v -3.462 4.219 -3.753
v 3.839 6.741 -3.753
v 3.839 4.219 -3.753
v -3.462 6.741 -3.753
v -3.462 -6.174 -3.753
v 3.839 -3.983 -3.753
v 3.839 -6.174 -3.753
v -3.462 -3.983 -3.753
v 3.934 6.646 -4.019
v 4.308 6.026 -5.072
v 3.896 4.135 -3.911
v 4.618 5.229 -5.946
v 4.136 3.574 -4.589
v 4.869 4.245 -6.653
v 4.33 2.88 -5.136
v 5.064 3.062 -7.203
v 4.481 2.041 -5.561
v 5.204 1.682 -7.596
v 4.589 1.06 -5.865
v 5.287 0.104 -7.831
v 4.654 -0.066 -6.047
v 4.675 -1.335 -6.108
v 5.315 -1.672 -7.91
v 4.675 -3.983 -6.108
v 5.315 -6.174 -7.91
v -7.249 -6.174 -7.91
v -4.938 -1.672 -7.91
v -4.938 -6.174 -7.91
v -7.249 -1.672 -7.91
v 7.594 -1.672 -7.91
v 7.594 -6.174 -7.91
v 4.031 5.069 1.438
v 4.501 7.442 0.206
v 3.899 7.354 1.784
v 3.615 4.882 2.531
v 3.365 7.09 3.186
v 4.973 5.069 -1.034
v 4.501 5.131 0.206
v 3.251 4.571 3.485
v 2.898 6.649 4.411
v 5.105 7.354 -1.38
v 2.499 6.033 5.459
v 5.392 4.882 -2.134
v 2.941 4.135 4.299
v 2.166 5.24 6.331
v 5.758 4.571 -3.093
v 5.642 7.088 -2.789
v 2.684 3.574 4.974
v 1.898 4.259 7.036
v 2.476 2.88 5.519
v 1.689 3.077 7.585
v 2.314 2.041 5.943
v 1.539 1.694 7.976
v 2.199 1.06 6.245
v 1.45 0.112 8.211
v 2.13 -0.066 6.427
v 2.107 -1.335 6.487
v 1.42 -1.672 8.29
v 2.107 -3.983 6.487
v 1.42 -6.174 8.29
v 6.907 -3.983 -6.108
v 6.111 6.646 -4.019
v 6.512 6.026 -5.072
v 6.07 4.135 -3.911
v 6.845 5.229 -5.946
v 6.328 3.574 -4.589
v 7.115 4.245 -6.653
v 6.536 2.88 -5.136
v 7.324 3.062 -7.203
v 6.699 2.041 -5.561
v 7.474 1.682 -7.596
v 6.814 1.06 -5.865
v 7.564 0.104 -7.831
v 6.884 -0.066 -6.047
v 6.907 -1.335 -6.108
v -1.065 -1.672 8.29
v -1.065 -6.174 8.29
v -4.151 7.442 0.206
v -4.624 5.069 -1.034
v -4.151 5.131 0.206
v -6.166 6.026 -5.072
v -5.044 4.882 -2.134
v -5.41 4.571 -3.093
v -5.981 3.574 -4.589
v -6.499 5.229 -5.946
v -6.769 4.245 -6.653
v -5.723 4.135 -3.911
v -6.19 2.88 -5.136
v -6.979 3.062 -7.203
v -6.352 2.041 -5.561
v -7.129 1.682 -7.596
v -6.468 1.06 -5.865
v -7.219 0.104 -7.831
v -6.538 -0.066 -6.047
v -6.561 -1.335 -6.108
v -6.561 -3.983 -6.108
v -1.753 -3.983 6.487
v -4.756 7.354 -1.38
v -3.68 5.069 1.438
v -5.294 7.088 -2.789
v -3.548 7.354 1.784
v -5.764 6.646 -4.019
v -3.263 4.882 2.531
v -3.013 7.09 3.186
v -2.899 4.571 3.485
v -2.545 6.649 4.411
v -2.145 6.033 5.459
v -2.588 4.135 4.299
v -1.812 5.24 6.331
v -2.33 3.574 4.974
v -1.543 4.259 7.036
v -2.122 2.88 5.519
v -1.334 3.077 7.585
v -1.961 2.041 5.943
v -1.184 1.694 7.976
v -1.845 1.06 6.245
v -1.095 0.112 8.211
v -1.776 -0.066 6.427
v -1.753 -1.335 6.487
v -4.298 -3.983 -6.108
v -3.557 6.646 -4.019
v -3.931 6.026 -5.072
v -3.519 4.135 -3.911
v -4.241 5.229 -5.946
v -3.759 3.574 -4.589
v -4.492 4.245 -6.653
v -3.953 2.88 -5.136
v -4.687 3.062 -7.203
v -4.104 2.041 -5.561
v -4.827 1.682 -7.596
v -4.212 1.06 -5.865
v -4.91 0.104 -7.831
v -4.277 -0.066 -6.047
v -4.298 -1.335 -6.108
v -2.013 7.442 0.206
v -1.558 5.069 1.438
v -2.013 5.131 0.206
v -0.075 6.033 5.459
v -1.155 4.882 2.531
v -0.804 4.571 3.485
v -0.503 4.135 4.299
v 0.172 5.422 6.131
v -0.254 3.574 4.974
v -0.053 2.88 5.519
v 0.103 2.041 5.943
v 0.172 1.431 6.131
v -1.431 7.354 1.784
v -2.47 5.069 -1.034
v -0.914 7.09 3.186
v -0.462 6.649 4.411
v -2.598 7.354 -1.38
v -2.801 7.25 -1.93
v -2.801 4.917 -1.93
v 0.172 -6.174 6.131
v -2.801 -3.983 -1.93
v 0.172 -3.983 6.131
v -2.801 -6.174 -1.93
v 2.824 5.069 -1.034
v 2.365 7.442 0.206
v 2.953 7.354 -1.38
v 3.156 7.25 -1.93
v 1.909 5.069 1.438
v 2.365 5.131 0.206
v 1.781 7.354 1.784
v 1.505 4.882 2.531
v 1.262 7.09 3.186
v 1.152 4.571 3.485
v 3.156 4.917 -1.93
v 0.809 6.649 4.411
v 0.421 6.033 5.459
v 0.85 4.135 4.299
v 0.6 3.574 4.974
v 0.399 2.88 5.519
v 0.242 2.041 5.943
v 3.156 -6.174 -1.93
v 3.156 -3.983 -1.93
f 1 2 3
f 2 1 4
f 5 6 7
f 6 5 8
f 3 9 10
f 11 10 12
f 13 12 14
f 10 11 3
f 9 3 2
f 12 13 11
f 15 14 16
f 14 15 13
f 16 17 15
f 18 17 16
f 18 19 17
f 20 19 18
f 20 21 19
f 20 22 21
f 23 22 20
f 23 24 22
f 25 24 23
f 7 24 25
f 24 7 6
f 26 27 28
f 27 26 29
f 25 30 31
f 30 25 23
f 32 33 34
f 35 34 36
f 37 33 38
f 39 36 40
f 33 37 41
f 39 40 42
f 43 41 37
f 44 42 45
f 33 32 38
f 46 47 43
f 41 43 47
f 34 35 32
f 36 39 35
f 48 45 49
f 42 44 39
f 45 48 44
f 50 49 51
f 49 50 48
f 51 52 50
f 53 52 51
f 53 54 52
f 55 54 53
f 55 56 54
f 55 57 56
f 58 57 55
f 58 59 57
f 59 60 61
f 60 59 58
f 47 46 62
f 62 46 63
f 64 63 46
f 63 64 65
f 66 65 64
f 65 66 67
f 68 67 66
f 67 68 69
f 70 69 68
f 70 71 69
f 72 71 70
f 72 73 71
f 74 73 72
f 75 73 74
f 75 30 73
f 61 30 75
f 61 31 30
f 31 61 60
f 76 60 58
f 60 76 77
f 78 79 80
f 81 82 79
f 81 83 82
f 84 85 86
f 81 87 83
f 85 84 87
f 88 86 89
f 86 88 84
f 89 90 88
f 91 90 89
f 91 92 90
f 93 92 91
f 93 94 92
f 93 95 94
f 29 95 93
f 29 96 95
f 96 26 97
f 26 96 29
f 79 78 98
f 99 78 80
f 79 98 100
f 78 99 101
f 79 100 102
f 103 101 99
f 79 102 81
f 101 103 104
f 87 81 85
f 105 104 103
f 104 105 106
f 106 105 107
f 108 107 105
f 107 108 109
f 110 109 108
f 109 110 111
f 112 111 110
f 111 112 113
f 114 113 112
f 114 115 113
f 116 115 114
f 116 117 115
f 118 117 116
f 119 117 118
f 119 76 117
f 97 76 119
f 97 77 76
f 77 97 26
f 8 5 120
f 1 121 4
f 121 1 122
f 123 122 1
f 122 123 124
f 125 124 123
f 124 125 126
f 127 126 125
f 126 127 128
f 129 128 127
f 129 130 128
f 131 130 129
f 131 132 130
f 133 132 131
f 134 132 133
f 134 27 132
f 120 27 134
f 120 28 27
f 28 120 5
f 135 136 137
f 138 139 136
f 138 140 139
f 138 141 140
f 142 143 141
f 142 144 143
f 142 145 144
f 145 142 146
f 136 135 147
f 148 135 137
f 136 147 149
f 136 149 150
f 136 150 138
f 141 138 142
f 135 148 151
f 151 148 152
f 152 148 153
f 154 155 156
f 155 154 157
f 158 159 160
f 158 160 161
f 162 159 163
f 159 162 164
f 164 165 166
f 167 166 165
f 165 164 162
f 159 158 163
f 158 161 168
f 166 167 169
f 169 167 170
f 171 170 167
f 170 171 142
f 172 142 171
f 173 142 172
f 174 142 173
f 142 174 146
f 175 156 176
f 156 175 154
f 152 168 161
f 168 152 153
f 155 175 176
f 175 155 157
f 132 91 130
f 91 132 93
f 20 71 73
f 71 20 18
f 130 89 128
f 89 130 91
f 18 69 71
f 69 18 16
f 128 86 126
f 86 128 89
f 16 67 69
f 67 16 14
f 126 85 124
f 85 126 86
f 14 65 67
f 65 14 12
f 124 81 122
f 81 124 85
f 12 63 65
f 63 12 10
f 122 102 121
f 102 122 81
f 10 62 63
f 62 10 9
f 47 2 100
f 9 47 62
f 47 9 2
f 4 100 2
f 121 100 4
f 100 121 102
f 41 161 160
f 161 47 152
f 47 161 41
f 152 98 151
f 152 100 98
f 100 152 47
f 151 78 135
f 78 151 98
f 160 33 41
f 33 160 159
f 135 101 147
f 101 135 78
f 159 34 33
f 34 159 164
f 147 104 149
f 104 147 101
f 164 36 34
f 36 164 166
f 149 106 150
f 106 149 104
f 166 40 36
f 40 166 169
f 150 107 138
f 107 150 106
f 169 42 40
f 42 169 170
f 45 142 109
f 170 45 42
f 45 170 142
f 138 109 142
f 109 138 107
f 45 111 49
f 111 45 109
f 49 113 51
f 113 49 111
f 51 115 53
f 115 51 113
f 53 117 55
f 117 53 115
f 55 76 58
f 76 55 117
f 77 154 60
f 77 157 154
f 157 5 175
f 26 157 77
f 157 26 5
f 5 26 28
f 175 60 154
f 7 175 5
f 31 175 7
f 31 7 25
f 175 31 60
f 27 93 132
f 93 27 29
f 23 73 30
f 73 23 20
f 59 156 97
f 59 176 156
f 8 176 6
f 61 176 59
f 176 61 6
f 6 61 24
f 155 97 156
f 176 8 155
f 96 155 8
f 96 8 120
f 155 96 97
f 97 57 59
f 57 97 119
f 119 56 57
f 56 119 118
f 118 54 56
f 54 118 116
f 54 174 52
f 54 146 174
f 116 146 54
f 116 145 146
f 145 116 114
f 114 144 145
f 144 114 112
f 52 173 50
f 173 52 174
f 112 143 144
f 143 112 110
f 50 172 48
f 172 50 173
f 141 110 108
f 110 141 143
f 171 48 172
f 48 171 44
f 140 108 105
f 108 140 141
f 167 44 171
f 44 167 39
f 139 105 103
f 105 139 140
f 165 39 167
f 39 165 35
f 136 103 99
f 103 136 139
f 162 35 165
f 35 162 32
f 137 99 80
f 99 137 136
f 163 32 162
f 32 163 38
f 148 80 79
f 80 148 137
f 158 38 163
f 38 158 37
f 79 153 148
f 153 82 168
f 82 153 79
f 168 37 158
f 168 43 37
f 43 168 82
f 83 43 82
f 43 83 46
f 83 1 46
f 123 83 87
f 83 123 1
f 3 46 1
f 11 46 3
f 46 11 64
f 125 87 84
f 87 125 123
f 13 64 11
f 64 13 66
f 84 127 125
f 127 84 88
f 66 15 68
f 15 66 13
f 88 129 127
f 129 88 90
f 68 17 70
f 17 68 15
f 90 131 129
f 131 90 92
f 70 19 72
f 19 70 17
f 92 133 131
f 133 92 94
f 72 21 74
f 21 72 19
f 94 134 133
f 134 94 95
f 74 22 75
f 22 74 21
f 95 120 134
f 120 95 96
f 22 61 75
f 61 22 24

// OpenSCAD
// Alphagram.scad
// Written by Jungyul Jin <returnfirst@gmail.com>
//
// Alphagram by Jungyul is licensed under the Creative Commons - Attribution - Share Alike license.

// How large will it be?
Size = 16; // [16:Small(16mm),32:Medium(32mm),48:Large(48mm)]

First_Character = "A";
Second_Character = "D";

// How to combine them?
How_To_Combine = 0; // [0:Front & Left side,1:Front & Right side]

// Select font style if possible.
Font_Style = "Black"; // [Regular,Bold,Black,Italic,Bold Italic,Black Italic]

//Sarpanch 부터 사용가능 (add date로 확인)

// Select the font you want. (visit google fonts site - fonts.google.com)
Select_Font = "Playfair Display"; //[ABeeZee,Abel,Abril Fatface,Aclonica,Acme,Actor,Adamina,Advent Pro,Aguafina Script,Akronim,Aladin,Aldrich,Alef,Alegreya,Alegreya Sans,Alegreya Sans SC,Alegreya SC,Alex Brush,Alfa Slab One,Alice,Alike,Alike Angular,Allan,Allerta,Allerta Stencil,Allura,Almendra,Almendra Display,Almendra SC,Amarante,Amaranth,Amatic SC,Amethysta,Amiri,Anaheim,Andada,Andika,Angkor,Annie Use Your Telescope,Anonymous Pro,Antic,Antic Didone,Antic Slab,Anton,Arapey,Arbutus,Arbutus Slab,Architects Daughter,Archivo Black,Archivo Narrow,Arimo,Arizonia,Armata,Artifika,Arvo,Asap,Asset,Astloch,Asul,Atomic Age,Aubrey,Audiowide,Autour One,Average,Average Sans,Averia Gruesa Libre,Averia Libre,Averia Sans Libre,Averia Serif Libre,Bad Script,Balthazar,Bangers,Basic,Battambang,Baumans,Bayon,Belgrano,Belleza,BenchNine,Bentham,Berkshire Swash,Bevan,Bigelow Rules,Bigshot One,Bilbo,Bilbo Swash Caps,Bitter,Black Ops One,Bokor,Bonbon,Boogaloo,Bowlby One,Bowlby One SC,Brawler,Bree Serif,Bubblegum Sans,Bubbler One,Buda,Buenard,Butcherman,Butterfly Kids,Cabin,Cabin Condensed,Cabin Sketch,Caesar Dressing,Cagliostro,Calligraffitti,Cambay,Cambo,Candal,Cantarell,Cantata One,Cantora One,Capriola,Cardo,Carme,Carrois Gothic,Carrois Gothic SC,Carter One,Caudex,Cedarville Cursive,Ceviche One,Changa One,Chango,Chau Philomene One,Chela One,Chelsea Market,Chenla,Cherry Cream Soda,Cherry Swash,Chewy,Chicle,Chivo,Cinzel,Cinzel Decorative,Clicker Script,Coda,Coda Caption,Codystar,Combo,Comfortaa,Coming Soon,Concert One,Condiment,Content,Contrail One,Convergence,Cookie,Copse,Corben,Courgette,Cousine,Coustard,Covered By Your Grace,Crafty Girls,Creepster,Crete Round,Crimson Text,Croissant One,Crushed,Cuprum,Cutive,Cutive Mono,Damion,Dancing Script,Dangrek,Dawning of a New Day,Days One,Dekko,Delius,Delius Swash Caps,Delius Unicase,Della Respira,Denk One,Devonshire,Dhurjati,Didact Gothic,Diplomata,Diplomata SC,Domine,Donegal One,Doppio One,Dorsa,Dosis,Dr Sugiyama,Droid Sans,Droid Sans Mono,Droid Serif,Duru Sans,Dynalight,Eagle Lake,Eater,EB Garamond,Economica,Ek Mukta,Electrolize,Elsie,Elsie Swash Caps,Emblema One,Emilys Candy,Engagement,Englebert,Enriqueta,Erica One,Esteban,Euphoria Script,Ewert,Exo,Exo 2,Expletus Sans,Fanwood Text,Fascinate,Fascinate Inline,Faster One,Fasthand,Fauna One,Federant,Federo,Felipa,Fenix,Finger Paint,Fira Mono,Fira Sans,Fjalla One,Fjord One,Flamenco,Flavors,Fondamento,Fontdiner Swanky,Forum,Francois One,Freckle Face,Fredericka the Great,Fredoka One,Freehand,Fresca,Frijole,Fruktur,Fugaz One,Gabriela,Gafata,Galdeano,Galindo,Gentium Basic,Gentium Book Basic,Geo,Geostar,Geostar Fill,Germania One,GFS Didot,GFS Neohellenic,Gidugu,Gilda Display,Give You Glory,Glass Antiqua,Glegoo,Gloria Hallelujah,Goblin One,Gochi Hand,Gorditas,Goudy Bookletter 1911,Graduate,Grand Hotel,Gravitas One,Great Vibes,Griffy,Gruppo,Gudea,Gurajada,Habibi,Halant,Hammersmith One,Hanalei,Hanalei Fill,Handlee,Hanuman,Happy Monkey,Headland One,Henny Penny,Herr Von Muellerhoff,Hind,Holtwood One SC,Homemade Apple,Homenaje,Iceberg,Iceland,IM Fell Double Pica,IM Fell Double Pica SC,IM Fell DW Pica,IM Fell DW Pica SC,IM Fell English,IM Fell English SC,IM Fell French Canon,IM Fell French Canon SC,IM Fell Great Primer,IM Fell Great Primer SC,Imprima,Inconsolata,Inder,Indie Flower,Inika,Irish Grover,Istok Web,Italiana,Italianno,Jacques Francois,Jacques Francois Shadow,Jim Nightshade,Jockey One,Jolly Lodger,Josefin Sans,Josefin Slab,Joti One,Judson,Julee,Julius Sans One,Junge,Jura,Just Another Hand,Just Me Again Down Here,Kalam,Kameron,Kantumruy,Karla,Karma,Kaushan Script,Kavoon,Kdam Thmor,Keania One,Kelly Slab,Kenia,Khand,Khmer,Khula,Kite One,Knewave,Kotta One,Koulen,Kranky,Kreon,Kristi,Krona One,La Belle Aurore,Laila,Lakki Reddy,Lancelot,Lateef,Lato,League Script,Leckerli One,Ledger,Lekton,Lemon,Liberation Sans,Libre Baskerville,Life Savers,Lilita One,Lily Script One,Limelight,Linden Hill,Lobster,Lobster Two,Londrina Outline,Londrina Shadow,Londrina Sketch,Londrina Solid,Lora,Love Ya Like A Sister,Loved by the King,Lovers Quarrel,Luckiest Guy,Lusitana,Lustria,Macondo,Macondo Swash Caps,Magra,Maiden Orange,Mako,Mallanna,Mandali,Marcellus,Marcellus SC,Marck Script,Margarine,Marko One,Marmelad,Martel Sans,Marvel,Mate,Mate SC,Maven Pro,McLaren,Meddon,MedievalSharp,Medula One,Megrim,Meie Script,Merienda,Merienda One,Merriweather,Merriweather Sans,Metal,Metal Mania,Metamorphous,Metrophobic,Michroma,Milonga,Miltonian,Miltonian Tattoo,Miniver,Miss Fajardose,Modak,Modern Antiqua,Molengo,Molle,Monda,Monofett,Monoton,Monsieur La Doulaise,Montaga,Montez,Montserrat,Montserrat Alternates,Montserrat Subrayada,Moul,Moulpali,Mountains of Christmas,Mouse Memoirs,Mr Bedfort,Mr Dafoe,Mr De Haviland,Mrs Saint Delafield,Mrs Sheppards,Muli,Mystery Quest,Neucha,Neuton,New Rocker,News Cycle,Niconne,Nixie One,Nobile,Nokora,Norican,Nosifer,Nothing You Could Do,Noticia Text,Noto Sans,Noto Serif,Nova Cut,Nova Flat,Nova Mono,Nova Oval,Nova Round,Nova Script,Nova Slim,Nova Square,NTR,Numans,Nunito,Odor Mean Chey,Offside,Old Standard TT,Oldenburg,Oleo Script,Oleo Script Swash Caps,Open Sans,Open Sans Condensed,Oranienbaum,Orbitron,Oregano,Orienta,Original Surfer,Oswald,Over the Rainbow,Overlock,Overlock SC,Ovo,Oxygen,Oxygen Mono,Pacifico,Paprika,Parisienne,Passero One,Passion One,Pathway Gothic One,Patrick Hand,Patrick Hand SC,Patua One,Paytone One,Peddana,Peralta,Permanent Marker,Petit Formal Script,Petrona,Philosopher,Piedra,Pinyon Script,Pirata One,Plaster,Play,Playball,Playfair Display,Playfair Display SC,Podkova,Poiret One,Poller One,Poly,Pompiere,Pontano Sans,Port Lligat Sans,Port Lligat Slab,Prata,Preahvihear,Press Start 2P,Princess Sofia,Prociono,Prosto One,PT Mono,PT Sans,PT Sans Caption,PT Sans Narrow,PT Serif,PT Serif Caption,Puritan,Purple Purse,Quando,Quantico,Quattrocento,Quattrocento Sans,Questrial,Quicksand,Quintessential,Qwigley,Racing Sans One,Radley,Rajdhani,Raleway,Raleway Dots,Ramabhadra,Ramaraja,Rambla,Rammetto One,Ranchers,Rancho,Ranga,Rationale,Ravi Prakash,Redressed,Reenie Beanie,Revalia,Ribeye,Ribeye Marrow,Righteous,Risque,Roboto,Roboto Condensed,Roboto Slab,Rochester,Rock Salt,Rokkitt,Romanesco,Ropa Sans,Rosario,Rosarivo,Rouge Script,Rozha One,Rubik Mono One,Rubik One,Ruda,Rufina,Ruge Boogie,Ruluko,Rum Raisin,Ruslan Display,Russo One,Ruthie,Rye,Sacramento,Sail,Salsa,Sanchez,Sancreek,Sansita One,Sarina,Sarpanch,Satisfy,Scada,Scheherazade,Schoolbell,Seaweed Script,Sevillana,Seymour One,Shadows Into Light,Shadows Into Light Two,Shanti,Share,Share Tech,Share Tech Mono,Shojumaru,Short Stack,Siemreap,Sigmar One,Signika,Signika Negative,Simonetta,Sintony,Sirin Stencil,Six Caps,Skranji,Slabo 13px,Slabo 27px,Slackey,Smokum,Smythe,Sniglet,Snippet,Snowburst One,Sofadi One,Sofia,Sonsie One,Sorts Mill Goudy,Source Code Pro,Source Sans Pro,Source Serif Pro,Special Elite,Spicy Rice,Spinnaker,Spirax,Squada One,Sree Krushnadevaraya,Stalemate,Stalinist One,Stardos Stencil,Stint Ultra Condensed,Stint Ultra Expanded,Stoke,Strait,Sue Ellen Francisco,Sunshiney,Supermercado One,Suranna,Suravaram,Suwannaphum,Swanky and Moo Moo,Syncopate,Tangerine,Taprom,Tauri,Teko,Telex,Tenali Ramakrishna,Tenor Sans,Text Me One,The Girl Next Door,Tienne,Timmana,Tinos,Titan One,Titillium Web,Trade Winds,Trocchi,Trochut,Trykker,Tulpen One,Ubuntu,Ubuntu Condensed,Ubuntu Mono,Ultra,Uncial Antiqua,Underdog,Unica One,UnifrakturCook,UnifrakturMaguntia,Unkempt,Unlock,Unna,Vampiro One,Varela,Varela Round,Vast Shadow,Vesper Libre,Vibur,Vidaloka,Viga,Voces,Volkhov,Vollkorn,Voltaire,VT323,Waiting for the Sunrise,Wallpoet,Walter Turncoat,Warnes,Wellfleet,Wendy One,Wire One,Yanone Kaffeesatz,Yellowtail,Yeseva One,Yesteryear,Zeyada]

// Select the desired material.
//Select_Material = 0; // [0:PLA, 1:ABS]

// Rotate the second character
Angle=0; // [0, 45, 90, 135, 180, 225, 270, 315]

module letter(l,s) {
  linear_extrude(height = Size*s) {
    text(l, size = Size, font = str(Select_Font,":style=",Font_Style), halign = "center", valign = "center", $fn = 32);
  }
}

render() {
    
    if (How_To_Combine == 0) {
        intersection() {
            translate([0, Size*3/2, 0]) rotate([90, 0, 0]) letter(First_Character,3);
            translate([-Size*3/2, 0, 0]) rotate([90, Angle, 90]) letter(Second_Character,3);
        }
    } else if (How_To_Combine == 1) {
        intersection() {
            translate([0, Size*3/2, 0]) rotate([90, 0, 0]) letter(First_Character,3);
            translate([Size*3/2, 0, 0]) rotate([90, Angle, -90]) letter(Second_Character,3);
        }
    }
}
